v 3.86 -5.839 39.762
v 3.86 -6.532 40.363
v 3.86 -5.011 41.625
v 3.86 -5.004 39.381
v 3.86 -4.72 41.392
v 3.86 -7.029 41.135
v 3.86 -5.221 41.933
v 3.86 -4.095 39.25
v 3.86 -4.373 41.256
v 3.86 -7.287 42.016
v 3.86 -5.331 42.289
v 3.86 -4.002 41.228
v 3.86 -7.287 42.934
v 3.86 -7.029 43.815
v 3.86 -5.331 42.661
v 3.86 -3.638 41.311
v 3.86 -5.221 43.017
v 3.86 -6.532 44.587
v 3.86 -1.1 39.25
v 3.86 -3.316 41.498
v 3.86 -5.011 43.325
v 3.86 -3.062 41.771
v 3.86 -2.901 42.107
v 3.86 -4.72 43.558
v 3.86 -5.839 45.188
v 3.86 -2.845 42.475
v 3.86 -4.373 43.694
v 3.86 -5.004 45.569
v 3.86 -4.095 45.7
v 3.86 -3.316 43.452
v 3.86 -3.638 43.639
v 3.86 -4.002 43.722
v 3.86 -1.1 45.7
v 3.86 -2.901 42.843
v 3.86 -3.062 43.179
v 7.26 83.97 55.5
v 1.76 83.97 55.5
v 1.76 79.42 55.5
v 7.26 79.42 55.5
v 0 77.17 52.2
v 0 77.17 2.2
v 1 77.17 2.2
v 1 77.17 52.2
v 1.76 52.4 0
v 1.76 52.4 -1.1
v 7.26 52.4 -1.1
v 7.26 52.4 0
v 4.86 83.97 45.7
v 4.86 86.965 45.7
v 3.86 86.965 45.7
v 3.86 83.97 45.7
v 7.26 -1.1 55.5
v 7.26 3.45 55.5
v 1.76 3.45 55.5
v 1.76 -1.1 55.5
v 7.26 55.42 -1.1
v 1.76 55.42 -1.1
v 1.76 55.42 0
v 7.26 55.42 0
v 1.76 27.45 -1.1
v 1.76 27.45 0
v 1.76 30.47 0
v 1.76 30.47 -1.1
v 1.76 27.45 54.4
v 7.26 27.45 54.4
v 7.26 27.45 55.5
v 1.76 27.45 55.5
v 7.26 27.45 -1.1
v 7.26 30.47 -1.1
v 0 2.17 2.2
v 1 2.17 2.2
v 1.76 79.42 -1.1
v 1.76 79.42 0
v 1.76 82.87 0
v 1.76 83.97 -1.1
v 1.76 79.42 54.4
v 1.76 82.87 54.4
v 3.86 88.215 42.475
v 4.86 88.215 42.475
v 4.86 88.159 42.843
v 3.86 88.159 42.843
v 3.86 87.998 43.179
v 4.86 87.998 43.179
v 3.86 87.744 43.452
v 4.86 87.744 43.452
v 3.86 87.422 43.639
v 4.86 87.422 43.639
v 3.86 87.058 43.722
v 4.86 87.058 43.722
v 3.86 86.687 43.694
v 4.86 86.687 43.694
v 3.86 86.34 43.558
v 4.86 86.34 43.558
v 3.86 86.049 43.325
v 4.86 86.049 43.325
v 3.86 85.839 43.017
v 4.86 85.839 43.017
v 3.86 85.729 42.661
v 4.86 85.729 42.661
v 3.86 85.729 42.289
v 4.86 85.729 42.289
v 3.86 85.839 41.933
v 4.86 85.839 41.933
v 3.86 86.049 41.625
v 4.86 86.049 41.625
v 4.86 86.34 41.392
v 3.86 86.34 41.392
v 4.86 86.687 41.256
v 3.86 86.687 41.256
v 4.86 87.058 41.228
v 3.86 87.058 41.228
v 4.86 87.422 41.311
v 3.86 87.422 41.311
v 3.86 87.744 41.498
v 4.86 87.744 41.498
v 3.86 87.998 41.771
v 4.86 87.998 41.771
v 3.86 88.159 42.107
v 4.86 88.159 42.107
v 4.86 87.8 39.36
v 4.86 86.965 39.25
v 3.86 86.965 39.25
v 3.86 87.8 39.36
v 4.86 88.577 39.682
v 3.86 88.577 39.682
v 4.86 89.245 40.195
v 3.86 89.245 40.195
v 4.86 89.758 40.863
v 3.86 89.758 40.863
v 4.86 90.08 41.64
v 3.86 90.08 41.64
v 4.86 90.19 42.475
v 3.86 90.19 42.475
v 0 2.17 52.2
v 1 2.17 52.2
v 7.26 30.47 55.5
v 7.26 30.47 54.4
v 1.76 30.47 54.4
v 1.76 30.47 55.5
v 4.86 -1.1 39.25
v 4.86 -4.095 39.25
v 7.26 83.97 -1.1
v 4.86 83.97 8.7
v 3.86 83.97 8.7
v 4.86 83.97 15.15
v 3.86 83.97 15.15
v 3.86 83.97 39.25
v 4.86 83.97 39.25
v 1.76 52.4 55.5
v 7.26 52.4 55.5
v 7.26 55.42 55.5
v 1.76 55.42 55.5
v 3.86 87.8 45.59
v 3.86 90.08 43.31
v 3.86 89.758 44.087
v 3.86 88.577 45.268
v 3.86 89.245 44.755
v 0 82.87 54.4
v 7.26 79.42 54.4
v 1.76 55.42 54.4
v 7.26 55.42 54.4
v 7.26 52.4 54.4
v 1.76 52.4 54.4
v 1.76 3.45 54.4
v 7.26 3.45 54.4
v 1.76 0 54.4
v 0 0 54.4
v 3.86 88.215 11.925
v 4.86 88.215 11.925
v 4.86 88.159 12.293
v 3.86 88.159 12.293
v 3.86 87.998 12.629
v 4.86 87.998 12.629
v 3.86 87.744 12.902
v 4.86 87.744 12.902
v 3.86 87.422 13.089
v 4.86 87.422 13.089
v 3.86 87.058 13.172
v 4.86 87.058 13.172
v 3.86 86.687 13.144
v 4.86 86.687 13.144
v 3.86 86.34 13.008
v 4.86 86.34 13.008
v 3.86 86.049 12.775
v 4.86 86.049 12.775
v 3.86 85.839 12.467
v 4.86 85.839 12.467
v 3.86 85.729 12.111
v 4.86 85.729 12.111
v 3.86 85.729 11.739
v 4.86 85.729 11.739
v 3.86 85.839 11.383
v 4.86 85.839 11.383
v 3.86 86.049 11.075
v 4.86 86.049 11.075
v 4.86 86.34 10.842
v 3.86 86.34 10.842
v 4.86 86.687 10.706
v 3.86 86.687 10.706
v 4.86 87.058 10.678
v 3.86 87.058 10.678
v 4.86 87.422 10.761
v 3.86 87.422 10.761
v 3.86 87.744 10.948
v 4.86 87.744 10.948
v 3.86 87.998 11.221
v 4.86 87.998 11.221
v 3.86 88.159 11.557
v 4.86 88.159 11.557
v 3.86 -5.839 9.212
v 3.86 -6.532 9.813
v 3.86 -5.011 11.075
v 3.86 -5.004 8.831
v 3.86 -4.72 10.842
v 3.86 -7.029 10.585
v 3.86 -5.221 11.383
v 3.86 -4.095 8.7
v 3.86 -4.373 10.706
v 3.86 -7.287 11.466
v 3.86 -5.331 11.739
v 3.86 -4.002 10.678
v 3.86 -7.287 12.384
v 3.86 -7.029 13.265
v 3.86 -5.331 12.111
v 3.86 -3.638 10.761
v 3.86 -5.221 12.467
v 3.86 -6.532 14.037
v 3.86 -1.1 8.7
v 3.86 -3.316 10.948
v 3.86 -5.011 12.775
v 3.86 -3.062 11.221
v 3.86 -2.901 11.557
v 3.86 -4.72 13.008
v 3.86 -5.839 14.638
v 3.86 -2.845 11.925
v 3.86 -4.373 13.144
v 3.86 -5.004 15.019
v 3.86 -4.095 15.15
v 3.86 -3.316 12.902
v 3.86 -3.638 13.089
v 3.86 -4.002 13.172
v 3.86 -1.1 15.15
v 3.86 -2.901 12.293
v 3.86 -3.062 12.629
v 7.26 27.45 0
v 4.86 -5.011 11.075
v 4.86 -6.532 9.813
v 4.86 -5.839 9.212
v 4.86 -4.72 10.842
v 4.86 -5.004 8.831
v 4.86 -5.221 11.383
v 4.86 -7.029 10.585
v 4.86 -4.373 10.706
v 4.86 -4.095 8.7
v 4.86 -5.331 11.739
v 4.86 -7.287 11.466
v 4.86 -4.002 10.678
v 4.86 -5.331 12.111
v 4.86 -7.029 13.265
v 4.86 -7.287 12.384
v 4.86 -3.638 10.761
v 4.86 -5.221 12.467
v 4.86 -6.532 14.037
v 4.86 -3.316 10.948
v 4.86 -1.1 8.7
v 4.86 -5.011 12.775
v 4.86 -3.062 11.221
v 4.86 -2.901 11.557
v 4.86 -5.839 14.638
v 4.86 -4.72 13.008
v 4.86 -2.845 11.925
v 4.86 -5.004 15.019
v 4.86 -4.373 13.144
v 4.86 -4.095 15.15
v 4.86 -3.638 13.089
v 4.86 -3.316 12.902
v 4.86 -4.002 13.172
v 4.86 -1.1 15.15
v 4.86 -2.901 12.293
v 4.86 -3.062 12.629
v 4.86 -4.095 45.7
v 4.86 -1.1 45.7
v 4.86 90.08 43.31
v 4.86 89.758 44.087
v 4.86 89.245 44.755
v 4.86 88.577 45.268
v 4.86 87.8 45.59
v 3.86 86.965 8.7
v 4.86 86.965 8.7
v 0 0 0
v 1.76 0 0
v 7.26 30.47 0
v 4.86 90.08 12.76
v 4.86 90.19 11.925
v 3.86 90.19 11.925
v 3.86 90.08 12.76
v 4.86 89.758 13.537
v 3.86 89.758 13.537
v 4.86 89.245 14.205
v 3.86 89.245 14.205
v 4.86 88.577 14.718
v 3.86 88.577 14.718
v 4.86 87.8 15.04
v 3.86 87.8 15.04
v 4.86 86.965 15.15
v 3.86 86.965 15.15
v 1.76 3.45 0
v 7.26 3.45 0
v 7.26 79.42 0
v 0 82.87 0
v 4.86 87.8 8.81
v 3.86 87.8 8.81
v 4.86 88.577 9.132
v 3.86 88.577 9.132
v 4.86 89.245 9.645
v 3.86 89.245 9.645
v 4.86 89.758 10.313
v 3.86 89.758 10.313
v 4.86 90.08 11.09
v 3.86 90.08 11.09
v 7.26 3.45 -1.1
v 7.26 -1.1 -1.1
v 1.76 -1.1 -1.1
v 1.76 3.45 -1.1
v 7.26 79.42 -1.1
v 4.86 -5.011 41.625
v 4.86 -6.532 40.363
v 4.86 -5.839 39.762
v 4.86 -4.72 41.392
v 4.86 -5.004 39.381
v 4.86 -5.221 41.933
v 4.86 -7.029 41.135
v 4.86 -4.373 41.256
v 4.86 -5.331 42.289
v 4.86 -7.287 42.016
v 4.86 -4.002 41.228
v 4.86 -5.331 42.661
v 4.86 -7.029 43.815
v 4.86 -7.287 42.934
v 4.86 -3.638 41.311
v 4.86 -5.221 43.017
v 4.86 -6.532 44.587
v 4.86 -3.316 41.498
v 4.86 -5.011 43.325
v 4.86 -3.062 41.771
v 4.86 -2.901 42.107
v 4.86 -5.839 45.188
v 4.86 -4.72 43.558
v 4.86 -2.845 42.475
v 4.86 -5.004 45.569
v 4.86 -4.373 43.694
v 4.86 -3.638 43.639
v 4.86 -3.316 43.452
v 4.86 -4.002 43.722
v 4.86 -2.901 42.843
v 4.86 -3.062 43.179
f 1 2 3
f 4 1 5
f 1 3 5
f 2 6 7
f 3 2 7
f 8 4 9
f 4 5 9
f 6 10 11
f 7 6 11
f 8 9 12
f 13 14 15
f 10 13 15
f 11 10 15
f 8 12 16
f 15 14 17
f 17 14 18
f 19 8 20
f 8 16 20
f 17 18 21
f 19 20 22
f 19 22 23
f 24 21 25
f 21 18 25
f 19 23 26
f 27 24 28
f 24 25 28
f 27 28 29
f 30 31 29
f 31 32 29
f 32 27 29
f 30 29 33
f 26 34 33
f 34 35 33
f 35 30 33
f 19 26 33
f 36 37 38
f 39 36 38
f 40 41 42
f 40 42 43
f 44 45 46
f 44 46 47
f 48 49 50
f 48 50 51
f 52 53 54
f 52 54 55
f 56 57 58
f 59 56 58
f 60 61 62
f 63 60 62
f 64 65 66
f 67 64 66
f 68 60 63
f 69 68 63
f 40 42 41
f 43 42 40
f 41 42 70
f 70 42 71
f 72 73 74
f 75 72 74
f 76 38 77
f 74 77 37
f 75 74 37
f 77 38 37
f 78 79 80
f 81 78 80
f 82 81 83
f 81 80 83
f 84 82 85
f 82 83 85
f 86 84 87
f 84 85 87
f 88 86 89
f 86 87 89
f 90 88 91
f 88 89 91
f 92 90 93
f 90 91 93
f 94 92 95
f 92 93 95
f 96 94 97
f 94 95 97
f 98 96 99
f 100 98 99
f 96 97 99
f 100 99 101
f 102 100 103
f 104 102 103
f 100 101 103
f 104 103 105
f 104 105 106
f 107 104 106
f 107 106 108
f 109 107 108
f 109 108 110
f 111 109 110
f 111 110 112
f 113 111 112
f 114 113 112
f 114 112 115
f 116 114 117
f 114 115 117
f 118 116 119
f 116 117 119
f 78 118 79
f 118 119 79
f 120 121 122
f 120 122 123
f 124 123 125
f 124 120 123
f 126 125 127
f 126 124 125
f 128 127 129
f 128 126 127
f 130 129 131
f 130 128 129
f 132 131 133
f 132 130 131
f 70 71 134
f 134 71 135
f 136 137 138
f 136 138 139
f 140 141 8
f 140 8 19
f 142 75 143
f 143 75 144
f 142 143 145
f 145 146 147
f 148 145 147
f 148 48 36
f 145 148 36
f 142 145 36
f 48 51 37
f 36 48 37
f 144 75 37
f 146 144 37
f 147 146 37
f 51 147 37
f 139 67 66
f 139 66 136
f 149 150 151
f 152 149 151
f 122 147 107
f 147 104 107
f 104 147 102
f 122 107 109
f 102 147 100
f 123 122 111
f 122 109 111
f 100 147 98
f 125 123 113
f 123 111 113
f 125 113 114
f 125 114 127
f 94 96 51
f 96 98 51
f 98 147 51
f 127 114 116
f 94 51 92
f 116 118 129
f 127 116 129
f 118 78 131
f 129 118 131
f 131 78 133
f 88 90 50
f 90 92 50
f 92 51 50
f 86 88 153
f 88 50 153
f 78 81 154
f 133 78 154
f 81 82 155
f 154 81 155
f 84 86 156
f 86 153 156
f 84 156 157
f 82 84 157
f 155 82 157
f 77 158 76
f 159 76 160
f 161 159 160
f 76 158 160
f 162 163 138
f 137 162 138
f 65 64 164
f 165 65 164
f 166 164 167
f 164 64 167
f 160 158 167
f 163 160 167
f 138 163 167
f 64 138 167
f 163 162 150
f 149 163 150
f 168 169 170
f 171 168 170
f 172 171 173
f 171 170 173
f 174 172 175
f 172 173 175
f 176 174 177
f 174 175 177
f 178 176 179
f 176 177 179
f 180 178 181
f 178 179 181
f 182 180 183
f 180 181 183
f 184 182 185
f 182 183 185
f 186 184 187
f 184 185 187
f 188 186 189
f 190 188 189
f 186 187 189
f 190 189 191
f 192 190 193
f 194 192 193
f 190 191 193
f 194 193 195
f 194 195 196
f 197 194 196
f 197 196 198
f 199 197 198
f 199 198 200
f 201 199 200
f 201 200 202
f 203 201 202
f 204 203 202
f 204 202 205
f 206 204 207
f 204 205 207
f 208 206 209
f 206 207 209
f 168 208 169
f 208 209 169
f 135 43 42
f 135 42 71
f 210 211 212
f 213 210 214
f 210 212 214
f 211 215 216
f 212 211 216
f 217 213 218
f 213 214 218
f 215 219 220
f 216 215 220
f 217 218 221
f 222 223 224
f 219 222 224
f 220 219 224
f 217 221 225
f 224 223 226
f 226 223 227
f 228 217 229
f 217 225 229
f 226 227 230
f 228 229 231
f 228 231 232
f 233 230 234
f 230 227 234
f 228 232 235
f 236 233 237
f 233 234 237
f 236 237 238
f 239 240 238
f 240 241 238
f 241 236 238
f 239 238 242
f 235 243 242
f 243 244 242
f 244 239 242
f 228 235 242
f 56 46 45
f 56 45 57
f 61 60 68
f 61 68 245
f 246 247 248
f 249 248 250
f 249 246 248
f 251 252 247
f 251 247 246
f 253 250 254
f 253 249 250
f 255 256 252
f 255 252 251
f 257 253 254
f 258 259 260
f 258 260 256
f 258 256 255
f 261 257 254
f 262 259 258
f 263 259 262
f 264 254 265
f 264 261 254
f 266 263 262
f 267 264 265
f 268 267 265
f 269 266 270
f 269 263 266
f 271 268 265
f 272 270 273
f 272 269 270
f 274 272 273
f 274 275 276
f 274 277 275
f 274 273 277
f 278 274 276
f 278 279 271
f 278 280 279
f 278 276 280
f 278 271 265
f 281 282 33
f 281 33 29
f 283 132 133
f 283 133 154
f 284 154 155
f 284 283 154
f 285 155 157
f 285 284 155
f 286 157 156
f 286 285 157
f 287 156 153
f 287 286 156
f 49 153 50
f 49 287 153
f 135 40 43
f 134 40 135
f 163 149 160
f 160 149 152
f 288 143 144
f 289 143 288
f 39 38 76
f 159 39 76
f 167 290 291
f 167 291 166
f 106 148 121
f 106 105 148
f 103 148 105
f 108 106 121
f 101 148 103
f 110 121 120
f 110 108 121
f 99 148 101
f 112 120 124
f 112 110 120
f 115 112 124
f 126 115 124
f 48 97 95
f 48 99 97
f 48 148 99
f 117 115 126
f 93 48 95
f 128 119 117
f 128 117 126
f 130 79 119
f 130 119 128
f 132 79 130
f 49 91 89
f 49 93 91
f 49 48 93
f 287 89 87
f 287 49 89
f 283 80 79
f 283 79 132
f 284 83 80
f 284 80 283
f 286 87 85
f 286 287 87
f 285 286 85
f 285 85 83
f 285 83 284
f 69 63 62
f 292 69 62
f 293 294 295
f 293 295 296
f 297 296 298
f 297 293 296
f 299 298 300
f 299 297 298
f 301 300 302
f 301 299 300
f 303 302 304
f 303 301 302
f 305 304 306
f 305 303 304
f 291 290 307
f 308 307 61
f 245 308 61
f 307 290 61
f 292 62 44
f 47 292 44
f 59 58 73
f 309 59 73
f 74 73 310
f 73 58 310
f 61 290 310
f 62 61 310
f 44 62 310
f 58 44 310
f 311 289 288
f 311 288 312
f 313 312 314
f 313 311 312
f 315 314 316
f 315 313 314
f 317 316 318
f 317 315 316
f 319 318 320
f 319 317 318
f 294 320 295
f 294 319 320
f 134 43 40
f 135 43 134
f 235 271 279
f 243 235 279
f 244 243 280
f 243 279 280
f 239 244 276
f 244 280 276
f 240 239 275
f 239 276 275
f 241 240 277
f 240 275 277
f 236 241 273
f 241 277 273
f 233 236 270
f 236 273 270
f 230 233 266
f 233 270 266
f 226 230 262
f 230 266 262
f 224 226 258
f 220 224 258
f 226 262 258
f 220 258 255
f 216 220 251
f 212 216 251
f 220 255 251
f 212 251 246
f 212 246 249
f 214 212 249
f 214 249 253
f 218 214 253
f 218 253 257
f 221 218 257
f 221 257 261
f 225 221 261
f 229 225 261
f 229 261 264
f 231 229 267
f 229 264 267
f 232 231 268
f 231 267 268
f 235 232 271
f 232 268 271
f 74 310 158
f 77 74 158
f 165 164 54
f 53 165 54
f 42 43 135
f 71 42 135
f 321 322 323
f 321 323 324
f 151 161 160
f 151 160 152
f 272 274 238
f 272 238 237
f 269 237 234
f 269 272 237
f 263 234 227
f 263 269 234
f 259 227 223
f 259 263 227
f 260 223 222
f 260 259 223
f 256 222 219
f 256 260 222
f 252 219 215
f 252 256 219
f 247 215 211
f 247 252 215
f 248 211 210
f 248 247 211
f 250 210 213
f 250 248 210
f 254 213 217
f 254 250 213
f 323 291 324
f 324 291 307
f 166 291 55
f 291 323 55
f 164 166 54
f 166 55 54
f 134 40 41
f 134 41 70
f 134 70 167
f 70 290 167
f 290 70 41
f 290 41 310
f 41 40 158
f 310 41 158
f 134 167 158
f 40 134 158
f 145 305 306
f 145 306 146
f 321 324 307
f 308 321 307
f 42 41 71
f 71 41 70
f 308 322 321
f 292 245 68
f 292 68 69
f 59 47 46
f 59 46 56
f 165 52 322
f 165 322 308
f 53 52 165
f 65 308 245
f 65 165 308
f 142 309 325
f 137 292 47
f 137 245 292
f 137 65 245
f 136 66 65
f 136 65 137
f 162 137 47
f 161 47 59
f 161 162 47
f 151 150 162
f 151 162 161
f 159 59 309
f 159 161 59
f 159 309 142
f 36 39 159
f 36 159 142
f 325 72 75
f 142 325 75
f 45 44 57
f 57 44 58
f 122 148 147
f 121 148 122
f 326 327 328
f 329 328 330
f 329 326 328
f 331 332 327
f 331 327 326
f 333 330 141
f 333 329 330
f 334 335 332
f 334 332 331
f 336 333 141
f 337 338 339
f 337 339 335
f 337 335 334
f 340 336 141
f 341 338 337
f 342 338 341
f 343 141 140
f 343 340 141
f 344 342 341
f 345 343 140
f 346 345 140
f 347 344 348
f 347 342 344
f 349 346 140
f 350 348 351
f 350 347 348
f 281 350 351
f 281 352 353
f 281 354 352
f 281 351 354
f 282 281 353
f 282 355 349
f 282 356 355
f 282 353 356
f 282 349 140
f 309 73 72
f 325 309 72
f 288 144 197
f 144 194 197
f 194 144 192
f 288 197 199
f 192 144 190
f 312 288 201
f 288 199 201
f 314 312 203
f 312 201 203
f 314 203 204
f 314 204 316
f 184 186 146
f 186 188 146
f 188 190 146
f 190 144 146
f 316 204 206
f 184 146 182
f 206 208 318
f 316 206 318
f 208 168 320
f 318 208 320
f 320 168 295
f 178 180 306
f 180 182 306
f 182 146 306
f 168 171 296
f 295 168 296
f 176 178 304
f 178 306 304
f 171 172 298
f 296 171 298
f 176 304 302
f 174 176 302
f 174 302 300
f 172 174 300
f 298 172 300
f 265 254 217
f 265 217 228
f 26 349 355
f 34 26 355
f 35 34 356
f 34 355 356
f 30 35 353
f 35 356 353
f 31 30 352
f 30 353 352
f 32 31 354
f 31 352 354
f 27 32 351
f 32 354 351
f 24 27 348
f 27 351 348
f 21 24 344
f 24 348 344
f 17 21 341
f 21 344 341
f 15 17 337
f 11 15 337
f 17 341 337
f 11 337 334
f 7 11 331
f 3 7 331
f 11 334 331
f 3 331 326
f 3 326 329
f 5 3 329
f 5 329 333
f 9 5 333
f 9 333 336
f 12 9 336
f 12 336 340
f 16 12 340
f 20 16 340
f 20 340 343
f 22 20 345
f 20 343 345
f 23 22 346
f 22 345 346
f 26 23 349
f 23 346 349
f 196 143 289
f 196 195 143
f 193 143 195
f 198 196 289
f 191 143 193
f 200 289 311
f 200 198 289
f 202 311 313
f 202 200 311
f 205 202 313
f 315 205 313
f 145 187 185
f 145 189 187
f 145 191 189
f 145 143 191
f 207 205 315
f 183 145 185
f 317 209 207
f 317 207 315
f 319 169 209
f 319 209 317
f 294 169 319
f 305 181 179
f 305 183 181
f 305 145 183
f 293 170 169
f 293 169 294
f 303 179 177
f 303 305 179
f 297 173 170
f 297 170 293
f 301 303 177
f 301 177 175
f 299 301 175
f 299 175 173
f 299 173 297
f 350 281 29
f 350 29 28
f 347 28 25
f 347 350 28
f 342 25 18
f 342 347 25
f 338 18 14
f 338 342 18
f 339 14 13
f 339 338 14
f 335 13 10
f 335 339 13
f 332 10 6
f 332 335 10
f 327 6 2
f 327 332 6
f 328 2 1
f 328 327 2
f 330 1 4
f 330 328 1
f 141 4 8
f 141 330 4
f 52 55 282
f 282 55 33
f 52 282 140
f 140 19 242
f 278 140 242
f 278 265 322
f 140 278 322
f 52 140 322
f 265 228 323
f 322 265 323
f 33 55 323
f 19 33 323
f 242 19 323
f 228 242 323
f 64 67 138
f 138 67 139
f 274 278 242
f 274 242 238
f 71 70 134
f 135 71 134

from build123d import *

# Parameters (mm, degrees)
F0_W      = 82.87
F0_H      = 54.4
F1_DEPTH  = 1.76
F2_W      = 3.02
F2_H      = 1.1
F3_DEPTH  = 5.5
F5_R      = 1.25
F6_DEPTH  = 1
F7_W      = 75
F7_H      = 50
F8_DEPTH  = 1
F9_W      = 75
F9_H      = 50
F10_DEPTH = 1


with BuildPart() as f1:
    # F0 (on Right) → F1 (new body)
    with BuildSketch(Plane.YZ):
        with Locations((41.435, 27.2)):
            Rectangle(F0_W, F0_H)
    extrude(amount=F1_DEPTH)

    # F2 (on face) → F3 (join)
    with BuildSketch(Plane.YZ.offset(1.76)):
        Polygon((0, 54.4), (0, 0), (3.45, 0), (27.45, 0), (30.47, 0), (52.4, 0), (55.42, 0), (79.42, 0), (82.87, 0), (82.87, 54.4), (79.42, 54.4), (55.42, 54.4), (52.4, 54.4), (30.47, 54.4), (27.45, 54.4), (3.45, 54.4), align=None)
        Polygon((3.45, 0), (0, 0), (0, 54.4), (3.45, 54.4), (3.45, 55.5), (-1.1, 55.5), (-1.1, -1.1), (3.45, -1.1), align=None)
        with Locations((28.96, -0.55)):
            Rectangle(F2_W, F2_H)
        with Locations((28.96, 54.95)):
            Rectangle(F2_W, F2_H)
        with Locations((53.91, -0.55)):
            Rectangle(F2_W, F2_H)
        with Locations((53.91, 54.95)):
            Rectangle(F2_W, F2_H)
        Polygon((82.87, 0), (79.42, 0), (79.42, -1.1), (83.97, -1.1), (83.97, 55.5), (79.42, 55.5), (79.42, 54.4), (82.87, 54.4), align=None)
    extrude(amount=F3_DEPTH)

    # F5 (on offset) → F6 (join)
    with BuildSketch(Plane.YZ.offset(4.86)):
        with BuildLine():
            ThreePointArc((86.965, 8.7), (89.2454193693, 9.6445806307), (90.19, 11.925))
            ThreePointArc((90.19, 11.925), (89.2454193693, 14.2054193693), (86.965, 15.15))
            ThreePointArc((86.965, 15.15), (85.156232888, 14.5950162049), (83.97, 13.1210769206))
            Line((83.97, 13.1210769206), (83.97, 10.7289230794))
            ThreePointArc((83.97, 10.7289230794), (85.156232888, 9.2549837951), (86.965, 8.7))
        make_face()
        with Locations((86.965, 11.925)):
            Circle(F5_R, mode=Mode.SUBTRACT)
        with BuildLine():
            ThreePointArc((83.97, 13.1210769206), (85.156232888, 14.5950162049), (86.965, 15.15))
            Line((86.965, 15.15), (83.97, 15.15))
            Line((83.97, 15.15), (83.97, 13.1210769206))
        make_face()
        with BuildLine():
            Line((83.97, 8.7), (86.965, 8.7))
            ThreePointArc((86.965, 8.7), (85.156232888, 9.2549837951), (83.97, 10.7289230794))
            Line((83.97, 10.7289230794), (83.97, 8.7))
        make_face()
        with BuildLine():
            Line((83.97, 10.7289230794), (83.97, 13.1210769206))
            ThreePointArc((83.97, 13.1210769206), (83.74, 11.925), (83.97, 10.7289230794))
        make_face()
        with BuildLine():
            ThreePointArc((86.965, 39.25), (89.2454193693, 40.1945806307), (90.19, 42.475))
            ThreePointArc((90.19, 42.475), (89.2454193693, 44.7554193693), (86.965, 45.7))
            ThreePointArc((86.965, 45.7), (85.156232888, 45.1450162049), (83.97, 43.6710769206))
            Line((83.97, 43.6710769206), (83.97, 41.2789230794))
            ThreePointArc((83.97, 41.2789230794), (85.156232888, 39.8049837951), (86.965, 39.25))
        make_face()
        with Locations((86.965, 42.475)):
            Circle(F5_R, mode=Mode.SUBTRACT)
        with BuildLine():
            ThreePointArc((83.97, 43.6710769206), (85.156232888, 45.1450162049), (86.965, 45.7))
            Line((86.965, 45.7), (83.97, 45.7))
            Line((83.97, 45.7), (83.97, 43.6710769206))
        make_face()
        with BuildLine():
            Line((83.97, 39.25), (86.965, 39.25))
            ThreePointArc((86.965, 39.25), (85.156232888, 39.8049837951), (83.97, 41.2789230794))
            Line((83.97, 41.2789230794), (83.97, 39.25))
        make_face()
        with BuildLine():
            Line((83.97, 41.2789230794), (83.97, 43.6710769206))
            ThreePointArc((83.97, 43.6710769206), (83.74, 42.475), (83.97, 41.2789230794))
        make_face()
        with BuildLine():
            Line((-1.1, 43.6710769206), (-1.1, 45.7))
            Line((-1.1, 45.7), (-4.095, 45.7))
            ThreePointArc((-4.095, 45.7), (-2.286232888, 45.1450162049), (-1.1, 43.6710769206))
        make_face()
        with BuildLine():
            ThreePointArc((-1.1, 43.6710769206), (-2.286232888, 45.1450162049), (-4.095, 45.7))
            ThreePointArc((-4.095, 45.7), (-7.32, 42.475), (-4.095, 39.25))
            ThreePointArc((-4.095, 39.25), (-2.286232888, 39.8049837951), (-1.1, 41.2789230794))
            Line((-1.1, 41.2789230794), (-1.1, 43.6710769206))
        make_face()
        with Locations((-4.095, 42.475)):
            Circle(F5_R, mode=Mode.SUBTRACT)
        with BuildLine():
            ThreePointArc((-0.87, 42.475), (-0.9280219451, 43.0839950739), (-1.1, 43.6710769206))
            Line((-1.1, 43.6710769206), (-1.1, 41.2789230794))
            ThreePointArc((-1.1, 41.2789230794), (-0.9280219451, 41.8660049261), (-0.87, 42.475))
        make_face()
        with BuildLine():
            ThreePointArc((-1.1, 41.2789230794), (-2.286232888, 39.8049837951), (-4.095, 39.25))
            Line((-4.095, 39.25), (-1.1, 39.25))
            Line((-1.1, 39.25), (-1.1, 41.2789230794))
        make_face()
        with BuildLine():
            Line((-4.095, 8.7), (-1.1, 8.7))
            Line((-1.1, 8.7), (-1.1, 10.7289230794))
            ThreePointArc((-1.1, 10.7289230794), (-2.286232888, 9.2549837951), (-4.095, 8.7))
        make_face()
        with BuildLine():
            ThreePointArc((-4.095, 15.15), (-7.32, 11.925), (-4.095, 8.7))
            ThreePointArc((-4.095, 8.7), (-2.286232888, 9.2549837951), (-1.1, 10.7289230794))
            Line((-1.1, 10.7289230794), (-1.1, 13.1210769206))
            ThreePointArc((-1.1, 13.1210769206), (-2.286232888, 14.5950162049), (-4.095, 15.15))
        make_face()
        with Locations((-4.095, 11.925)):
            Circle(F5_R, mode=Mode.SUBTRACT)
        with BuildLine():
            Line((-1.1, 13.1210769206), (-1.1, 10.7289230794))
            ThreePointArc((-1.1, 10.7289230794), (-0.9280219451, 11.3160049261), (-0.87, 11.925))
            ThreePointArc((-0.87, 11.925), (-0.9280219451, 12.5339950739), (-1.1, 13.1210769206))
        make_face()
        with BuildLine():
            Line((-1.1, 15.15), (-4.095, 15.15))
            ThreePointArc((-4.095, 15.15), (-2.286232888, 14.5950162049), (-1.1, 13.1210769206))
            Line((-1.1, 13.1210769206), (-1.1, 15.15))
        make_face()
    extrude(amount=-F6_DEPTH)

    # F7 (on face) → F8 (cut)
    with BuildSketch(Plane(origin=(0, 0, 0), x_dir=(0, -1, 0), z_dir=(-1, 0, 0))):
        with Locations((-39.67, 27.2)):
            Rectangle(F7_W, F7_H)
    extrude(amount=-F8_DEPTH, mode=Mode.SUBTRACT)


with BuildPart() as f10:
    # F9 (on face) → F10 (new body)
    with BuildSketch(Plane(origin=(1, 0, 0), x_dir=(0, -1, 0), z_dir=(-1, 0, 0))):
        with Locations((-39.67, 27.2)):
            Rectangle(F9_W, F9_H)
    extrude(amount=F10_DEPTH)


solid = Compound([f1.part, f10.part])
